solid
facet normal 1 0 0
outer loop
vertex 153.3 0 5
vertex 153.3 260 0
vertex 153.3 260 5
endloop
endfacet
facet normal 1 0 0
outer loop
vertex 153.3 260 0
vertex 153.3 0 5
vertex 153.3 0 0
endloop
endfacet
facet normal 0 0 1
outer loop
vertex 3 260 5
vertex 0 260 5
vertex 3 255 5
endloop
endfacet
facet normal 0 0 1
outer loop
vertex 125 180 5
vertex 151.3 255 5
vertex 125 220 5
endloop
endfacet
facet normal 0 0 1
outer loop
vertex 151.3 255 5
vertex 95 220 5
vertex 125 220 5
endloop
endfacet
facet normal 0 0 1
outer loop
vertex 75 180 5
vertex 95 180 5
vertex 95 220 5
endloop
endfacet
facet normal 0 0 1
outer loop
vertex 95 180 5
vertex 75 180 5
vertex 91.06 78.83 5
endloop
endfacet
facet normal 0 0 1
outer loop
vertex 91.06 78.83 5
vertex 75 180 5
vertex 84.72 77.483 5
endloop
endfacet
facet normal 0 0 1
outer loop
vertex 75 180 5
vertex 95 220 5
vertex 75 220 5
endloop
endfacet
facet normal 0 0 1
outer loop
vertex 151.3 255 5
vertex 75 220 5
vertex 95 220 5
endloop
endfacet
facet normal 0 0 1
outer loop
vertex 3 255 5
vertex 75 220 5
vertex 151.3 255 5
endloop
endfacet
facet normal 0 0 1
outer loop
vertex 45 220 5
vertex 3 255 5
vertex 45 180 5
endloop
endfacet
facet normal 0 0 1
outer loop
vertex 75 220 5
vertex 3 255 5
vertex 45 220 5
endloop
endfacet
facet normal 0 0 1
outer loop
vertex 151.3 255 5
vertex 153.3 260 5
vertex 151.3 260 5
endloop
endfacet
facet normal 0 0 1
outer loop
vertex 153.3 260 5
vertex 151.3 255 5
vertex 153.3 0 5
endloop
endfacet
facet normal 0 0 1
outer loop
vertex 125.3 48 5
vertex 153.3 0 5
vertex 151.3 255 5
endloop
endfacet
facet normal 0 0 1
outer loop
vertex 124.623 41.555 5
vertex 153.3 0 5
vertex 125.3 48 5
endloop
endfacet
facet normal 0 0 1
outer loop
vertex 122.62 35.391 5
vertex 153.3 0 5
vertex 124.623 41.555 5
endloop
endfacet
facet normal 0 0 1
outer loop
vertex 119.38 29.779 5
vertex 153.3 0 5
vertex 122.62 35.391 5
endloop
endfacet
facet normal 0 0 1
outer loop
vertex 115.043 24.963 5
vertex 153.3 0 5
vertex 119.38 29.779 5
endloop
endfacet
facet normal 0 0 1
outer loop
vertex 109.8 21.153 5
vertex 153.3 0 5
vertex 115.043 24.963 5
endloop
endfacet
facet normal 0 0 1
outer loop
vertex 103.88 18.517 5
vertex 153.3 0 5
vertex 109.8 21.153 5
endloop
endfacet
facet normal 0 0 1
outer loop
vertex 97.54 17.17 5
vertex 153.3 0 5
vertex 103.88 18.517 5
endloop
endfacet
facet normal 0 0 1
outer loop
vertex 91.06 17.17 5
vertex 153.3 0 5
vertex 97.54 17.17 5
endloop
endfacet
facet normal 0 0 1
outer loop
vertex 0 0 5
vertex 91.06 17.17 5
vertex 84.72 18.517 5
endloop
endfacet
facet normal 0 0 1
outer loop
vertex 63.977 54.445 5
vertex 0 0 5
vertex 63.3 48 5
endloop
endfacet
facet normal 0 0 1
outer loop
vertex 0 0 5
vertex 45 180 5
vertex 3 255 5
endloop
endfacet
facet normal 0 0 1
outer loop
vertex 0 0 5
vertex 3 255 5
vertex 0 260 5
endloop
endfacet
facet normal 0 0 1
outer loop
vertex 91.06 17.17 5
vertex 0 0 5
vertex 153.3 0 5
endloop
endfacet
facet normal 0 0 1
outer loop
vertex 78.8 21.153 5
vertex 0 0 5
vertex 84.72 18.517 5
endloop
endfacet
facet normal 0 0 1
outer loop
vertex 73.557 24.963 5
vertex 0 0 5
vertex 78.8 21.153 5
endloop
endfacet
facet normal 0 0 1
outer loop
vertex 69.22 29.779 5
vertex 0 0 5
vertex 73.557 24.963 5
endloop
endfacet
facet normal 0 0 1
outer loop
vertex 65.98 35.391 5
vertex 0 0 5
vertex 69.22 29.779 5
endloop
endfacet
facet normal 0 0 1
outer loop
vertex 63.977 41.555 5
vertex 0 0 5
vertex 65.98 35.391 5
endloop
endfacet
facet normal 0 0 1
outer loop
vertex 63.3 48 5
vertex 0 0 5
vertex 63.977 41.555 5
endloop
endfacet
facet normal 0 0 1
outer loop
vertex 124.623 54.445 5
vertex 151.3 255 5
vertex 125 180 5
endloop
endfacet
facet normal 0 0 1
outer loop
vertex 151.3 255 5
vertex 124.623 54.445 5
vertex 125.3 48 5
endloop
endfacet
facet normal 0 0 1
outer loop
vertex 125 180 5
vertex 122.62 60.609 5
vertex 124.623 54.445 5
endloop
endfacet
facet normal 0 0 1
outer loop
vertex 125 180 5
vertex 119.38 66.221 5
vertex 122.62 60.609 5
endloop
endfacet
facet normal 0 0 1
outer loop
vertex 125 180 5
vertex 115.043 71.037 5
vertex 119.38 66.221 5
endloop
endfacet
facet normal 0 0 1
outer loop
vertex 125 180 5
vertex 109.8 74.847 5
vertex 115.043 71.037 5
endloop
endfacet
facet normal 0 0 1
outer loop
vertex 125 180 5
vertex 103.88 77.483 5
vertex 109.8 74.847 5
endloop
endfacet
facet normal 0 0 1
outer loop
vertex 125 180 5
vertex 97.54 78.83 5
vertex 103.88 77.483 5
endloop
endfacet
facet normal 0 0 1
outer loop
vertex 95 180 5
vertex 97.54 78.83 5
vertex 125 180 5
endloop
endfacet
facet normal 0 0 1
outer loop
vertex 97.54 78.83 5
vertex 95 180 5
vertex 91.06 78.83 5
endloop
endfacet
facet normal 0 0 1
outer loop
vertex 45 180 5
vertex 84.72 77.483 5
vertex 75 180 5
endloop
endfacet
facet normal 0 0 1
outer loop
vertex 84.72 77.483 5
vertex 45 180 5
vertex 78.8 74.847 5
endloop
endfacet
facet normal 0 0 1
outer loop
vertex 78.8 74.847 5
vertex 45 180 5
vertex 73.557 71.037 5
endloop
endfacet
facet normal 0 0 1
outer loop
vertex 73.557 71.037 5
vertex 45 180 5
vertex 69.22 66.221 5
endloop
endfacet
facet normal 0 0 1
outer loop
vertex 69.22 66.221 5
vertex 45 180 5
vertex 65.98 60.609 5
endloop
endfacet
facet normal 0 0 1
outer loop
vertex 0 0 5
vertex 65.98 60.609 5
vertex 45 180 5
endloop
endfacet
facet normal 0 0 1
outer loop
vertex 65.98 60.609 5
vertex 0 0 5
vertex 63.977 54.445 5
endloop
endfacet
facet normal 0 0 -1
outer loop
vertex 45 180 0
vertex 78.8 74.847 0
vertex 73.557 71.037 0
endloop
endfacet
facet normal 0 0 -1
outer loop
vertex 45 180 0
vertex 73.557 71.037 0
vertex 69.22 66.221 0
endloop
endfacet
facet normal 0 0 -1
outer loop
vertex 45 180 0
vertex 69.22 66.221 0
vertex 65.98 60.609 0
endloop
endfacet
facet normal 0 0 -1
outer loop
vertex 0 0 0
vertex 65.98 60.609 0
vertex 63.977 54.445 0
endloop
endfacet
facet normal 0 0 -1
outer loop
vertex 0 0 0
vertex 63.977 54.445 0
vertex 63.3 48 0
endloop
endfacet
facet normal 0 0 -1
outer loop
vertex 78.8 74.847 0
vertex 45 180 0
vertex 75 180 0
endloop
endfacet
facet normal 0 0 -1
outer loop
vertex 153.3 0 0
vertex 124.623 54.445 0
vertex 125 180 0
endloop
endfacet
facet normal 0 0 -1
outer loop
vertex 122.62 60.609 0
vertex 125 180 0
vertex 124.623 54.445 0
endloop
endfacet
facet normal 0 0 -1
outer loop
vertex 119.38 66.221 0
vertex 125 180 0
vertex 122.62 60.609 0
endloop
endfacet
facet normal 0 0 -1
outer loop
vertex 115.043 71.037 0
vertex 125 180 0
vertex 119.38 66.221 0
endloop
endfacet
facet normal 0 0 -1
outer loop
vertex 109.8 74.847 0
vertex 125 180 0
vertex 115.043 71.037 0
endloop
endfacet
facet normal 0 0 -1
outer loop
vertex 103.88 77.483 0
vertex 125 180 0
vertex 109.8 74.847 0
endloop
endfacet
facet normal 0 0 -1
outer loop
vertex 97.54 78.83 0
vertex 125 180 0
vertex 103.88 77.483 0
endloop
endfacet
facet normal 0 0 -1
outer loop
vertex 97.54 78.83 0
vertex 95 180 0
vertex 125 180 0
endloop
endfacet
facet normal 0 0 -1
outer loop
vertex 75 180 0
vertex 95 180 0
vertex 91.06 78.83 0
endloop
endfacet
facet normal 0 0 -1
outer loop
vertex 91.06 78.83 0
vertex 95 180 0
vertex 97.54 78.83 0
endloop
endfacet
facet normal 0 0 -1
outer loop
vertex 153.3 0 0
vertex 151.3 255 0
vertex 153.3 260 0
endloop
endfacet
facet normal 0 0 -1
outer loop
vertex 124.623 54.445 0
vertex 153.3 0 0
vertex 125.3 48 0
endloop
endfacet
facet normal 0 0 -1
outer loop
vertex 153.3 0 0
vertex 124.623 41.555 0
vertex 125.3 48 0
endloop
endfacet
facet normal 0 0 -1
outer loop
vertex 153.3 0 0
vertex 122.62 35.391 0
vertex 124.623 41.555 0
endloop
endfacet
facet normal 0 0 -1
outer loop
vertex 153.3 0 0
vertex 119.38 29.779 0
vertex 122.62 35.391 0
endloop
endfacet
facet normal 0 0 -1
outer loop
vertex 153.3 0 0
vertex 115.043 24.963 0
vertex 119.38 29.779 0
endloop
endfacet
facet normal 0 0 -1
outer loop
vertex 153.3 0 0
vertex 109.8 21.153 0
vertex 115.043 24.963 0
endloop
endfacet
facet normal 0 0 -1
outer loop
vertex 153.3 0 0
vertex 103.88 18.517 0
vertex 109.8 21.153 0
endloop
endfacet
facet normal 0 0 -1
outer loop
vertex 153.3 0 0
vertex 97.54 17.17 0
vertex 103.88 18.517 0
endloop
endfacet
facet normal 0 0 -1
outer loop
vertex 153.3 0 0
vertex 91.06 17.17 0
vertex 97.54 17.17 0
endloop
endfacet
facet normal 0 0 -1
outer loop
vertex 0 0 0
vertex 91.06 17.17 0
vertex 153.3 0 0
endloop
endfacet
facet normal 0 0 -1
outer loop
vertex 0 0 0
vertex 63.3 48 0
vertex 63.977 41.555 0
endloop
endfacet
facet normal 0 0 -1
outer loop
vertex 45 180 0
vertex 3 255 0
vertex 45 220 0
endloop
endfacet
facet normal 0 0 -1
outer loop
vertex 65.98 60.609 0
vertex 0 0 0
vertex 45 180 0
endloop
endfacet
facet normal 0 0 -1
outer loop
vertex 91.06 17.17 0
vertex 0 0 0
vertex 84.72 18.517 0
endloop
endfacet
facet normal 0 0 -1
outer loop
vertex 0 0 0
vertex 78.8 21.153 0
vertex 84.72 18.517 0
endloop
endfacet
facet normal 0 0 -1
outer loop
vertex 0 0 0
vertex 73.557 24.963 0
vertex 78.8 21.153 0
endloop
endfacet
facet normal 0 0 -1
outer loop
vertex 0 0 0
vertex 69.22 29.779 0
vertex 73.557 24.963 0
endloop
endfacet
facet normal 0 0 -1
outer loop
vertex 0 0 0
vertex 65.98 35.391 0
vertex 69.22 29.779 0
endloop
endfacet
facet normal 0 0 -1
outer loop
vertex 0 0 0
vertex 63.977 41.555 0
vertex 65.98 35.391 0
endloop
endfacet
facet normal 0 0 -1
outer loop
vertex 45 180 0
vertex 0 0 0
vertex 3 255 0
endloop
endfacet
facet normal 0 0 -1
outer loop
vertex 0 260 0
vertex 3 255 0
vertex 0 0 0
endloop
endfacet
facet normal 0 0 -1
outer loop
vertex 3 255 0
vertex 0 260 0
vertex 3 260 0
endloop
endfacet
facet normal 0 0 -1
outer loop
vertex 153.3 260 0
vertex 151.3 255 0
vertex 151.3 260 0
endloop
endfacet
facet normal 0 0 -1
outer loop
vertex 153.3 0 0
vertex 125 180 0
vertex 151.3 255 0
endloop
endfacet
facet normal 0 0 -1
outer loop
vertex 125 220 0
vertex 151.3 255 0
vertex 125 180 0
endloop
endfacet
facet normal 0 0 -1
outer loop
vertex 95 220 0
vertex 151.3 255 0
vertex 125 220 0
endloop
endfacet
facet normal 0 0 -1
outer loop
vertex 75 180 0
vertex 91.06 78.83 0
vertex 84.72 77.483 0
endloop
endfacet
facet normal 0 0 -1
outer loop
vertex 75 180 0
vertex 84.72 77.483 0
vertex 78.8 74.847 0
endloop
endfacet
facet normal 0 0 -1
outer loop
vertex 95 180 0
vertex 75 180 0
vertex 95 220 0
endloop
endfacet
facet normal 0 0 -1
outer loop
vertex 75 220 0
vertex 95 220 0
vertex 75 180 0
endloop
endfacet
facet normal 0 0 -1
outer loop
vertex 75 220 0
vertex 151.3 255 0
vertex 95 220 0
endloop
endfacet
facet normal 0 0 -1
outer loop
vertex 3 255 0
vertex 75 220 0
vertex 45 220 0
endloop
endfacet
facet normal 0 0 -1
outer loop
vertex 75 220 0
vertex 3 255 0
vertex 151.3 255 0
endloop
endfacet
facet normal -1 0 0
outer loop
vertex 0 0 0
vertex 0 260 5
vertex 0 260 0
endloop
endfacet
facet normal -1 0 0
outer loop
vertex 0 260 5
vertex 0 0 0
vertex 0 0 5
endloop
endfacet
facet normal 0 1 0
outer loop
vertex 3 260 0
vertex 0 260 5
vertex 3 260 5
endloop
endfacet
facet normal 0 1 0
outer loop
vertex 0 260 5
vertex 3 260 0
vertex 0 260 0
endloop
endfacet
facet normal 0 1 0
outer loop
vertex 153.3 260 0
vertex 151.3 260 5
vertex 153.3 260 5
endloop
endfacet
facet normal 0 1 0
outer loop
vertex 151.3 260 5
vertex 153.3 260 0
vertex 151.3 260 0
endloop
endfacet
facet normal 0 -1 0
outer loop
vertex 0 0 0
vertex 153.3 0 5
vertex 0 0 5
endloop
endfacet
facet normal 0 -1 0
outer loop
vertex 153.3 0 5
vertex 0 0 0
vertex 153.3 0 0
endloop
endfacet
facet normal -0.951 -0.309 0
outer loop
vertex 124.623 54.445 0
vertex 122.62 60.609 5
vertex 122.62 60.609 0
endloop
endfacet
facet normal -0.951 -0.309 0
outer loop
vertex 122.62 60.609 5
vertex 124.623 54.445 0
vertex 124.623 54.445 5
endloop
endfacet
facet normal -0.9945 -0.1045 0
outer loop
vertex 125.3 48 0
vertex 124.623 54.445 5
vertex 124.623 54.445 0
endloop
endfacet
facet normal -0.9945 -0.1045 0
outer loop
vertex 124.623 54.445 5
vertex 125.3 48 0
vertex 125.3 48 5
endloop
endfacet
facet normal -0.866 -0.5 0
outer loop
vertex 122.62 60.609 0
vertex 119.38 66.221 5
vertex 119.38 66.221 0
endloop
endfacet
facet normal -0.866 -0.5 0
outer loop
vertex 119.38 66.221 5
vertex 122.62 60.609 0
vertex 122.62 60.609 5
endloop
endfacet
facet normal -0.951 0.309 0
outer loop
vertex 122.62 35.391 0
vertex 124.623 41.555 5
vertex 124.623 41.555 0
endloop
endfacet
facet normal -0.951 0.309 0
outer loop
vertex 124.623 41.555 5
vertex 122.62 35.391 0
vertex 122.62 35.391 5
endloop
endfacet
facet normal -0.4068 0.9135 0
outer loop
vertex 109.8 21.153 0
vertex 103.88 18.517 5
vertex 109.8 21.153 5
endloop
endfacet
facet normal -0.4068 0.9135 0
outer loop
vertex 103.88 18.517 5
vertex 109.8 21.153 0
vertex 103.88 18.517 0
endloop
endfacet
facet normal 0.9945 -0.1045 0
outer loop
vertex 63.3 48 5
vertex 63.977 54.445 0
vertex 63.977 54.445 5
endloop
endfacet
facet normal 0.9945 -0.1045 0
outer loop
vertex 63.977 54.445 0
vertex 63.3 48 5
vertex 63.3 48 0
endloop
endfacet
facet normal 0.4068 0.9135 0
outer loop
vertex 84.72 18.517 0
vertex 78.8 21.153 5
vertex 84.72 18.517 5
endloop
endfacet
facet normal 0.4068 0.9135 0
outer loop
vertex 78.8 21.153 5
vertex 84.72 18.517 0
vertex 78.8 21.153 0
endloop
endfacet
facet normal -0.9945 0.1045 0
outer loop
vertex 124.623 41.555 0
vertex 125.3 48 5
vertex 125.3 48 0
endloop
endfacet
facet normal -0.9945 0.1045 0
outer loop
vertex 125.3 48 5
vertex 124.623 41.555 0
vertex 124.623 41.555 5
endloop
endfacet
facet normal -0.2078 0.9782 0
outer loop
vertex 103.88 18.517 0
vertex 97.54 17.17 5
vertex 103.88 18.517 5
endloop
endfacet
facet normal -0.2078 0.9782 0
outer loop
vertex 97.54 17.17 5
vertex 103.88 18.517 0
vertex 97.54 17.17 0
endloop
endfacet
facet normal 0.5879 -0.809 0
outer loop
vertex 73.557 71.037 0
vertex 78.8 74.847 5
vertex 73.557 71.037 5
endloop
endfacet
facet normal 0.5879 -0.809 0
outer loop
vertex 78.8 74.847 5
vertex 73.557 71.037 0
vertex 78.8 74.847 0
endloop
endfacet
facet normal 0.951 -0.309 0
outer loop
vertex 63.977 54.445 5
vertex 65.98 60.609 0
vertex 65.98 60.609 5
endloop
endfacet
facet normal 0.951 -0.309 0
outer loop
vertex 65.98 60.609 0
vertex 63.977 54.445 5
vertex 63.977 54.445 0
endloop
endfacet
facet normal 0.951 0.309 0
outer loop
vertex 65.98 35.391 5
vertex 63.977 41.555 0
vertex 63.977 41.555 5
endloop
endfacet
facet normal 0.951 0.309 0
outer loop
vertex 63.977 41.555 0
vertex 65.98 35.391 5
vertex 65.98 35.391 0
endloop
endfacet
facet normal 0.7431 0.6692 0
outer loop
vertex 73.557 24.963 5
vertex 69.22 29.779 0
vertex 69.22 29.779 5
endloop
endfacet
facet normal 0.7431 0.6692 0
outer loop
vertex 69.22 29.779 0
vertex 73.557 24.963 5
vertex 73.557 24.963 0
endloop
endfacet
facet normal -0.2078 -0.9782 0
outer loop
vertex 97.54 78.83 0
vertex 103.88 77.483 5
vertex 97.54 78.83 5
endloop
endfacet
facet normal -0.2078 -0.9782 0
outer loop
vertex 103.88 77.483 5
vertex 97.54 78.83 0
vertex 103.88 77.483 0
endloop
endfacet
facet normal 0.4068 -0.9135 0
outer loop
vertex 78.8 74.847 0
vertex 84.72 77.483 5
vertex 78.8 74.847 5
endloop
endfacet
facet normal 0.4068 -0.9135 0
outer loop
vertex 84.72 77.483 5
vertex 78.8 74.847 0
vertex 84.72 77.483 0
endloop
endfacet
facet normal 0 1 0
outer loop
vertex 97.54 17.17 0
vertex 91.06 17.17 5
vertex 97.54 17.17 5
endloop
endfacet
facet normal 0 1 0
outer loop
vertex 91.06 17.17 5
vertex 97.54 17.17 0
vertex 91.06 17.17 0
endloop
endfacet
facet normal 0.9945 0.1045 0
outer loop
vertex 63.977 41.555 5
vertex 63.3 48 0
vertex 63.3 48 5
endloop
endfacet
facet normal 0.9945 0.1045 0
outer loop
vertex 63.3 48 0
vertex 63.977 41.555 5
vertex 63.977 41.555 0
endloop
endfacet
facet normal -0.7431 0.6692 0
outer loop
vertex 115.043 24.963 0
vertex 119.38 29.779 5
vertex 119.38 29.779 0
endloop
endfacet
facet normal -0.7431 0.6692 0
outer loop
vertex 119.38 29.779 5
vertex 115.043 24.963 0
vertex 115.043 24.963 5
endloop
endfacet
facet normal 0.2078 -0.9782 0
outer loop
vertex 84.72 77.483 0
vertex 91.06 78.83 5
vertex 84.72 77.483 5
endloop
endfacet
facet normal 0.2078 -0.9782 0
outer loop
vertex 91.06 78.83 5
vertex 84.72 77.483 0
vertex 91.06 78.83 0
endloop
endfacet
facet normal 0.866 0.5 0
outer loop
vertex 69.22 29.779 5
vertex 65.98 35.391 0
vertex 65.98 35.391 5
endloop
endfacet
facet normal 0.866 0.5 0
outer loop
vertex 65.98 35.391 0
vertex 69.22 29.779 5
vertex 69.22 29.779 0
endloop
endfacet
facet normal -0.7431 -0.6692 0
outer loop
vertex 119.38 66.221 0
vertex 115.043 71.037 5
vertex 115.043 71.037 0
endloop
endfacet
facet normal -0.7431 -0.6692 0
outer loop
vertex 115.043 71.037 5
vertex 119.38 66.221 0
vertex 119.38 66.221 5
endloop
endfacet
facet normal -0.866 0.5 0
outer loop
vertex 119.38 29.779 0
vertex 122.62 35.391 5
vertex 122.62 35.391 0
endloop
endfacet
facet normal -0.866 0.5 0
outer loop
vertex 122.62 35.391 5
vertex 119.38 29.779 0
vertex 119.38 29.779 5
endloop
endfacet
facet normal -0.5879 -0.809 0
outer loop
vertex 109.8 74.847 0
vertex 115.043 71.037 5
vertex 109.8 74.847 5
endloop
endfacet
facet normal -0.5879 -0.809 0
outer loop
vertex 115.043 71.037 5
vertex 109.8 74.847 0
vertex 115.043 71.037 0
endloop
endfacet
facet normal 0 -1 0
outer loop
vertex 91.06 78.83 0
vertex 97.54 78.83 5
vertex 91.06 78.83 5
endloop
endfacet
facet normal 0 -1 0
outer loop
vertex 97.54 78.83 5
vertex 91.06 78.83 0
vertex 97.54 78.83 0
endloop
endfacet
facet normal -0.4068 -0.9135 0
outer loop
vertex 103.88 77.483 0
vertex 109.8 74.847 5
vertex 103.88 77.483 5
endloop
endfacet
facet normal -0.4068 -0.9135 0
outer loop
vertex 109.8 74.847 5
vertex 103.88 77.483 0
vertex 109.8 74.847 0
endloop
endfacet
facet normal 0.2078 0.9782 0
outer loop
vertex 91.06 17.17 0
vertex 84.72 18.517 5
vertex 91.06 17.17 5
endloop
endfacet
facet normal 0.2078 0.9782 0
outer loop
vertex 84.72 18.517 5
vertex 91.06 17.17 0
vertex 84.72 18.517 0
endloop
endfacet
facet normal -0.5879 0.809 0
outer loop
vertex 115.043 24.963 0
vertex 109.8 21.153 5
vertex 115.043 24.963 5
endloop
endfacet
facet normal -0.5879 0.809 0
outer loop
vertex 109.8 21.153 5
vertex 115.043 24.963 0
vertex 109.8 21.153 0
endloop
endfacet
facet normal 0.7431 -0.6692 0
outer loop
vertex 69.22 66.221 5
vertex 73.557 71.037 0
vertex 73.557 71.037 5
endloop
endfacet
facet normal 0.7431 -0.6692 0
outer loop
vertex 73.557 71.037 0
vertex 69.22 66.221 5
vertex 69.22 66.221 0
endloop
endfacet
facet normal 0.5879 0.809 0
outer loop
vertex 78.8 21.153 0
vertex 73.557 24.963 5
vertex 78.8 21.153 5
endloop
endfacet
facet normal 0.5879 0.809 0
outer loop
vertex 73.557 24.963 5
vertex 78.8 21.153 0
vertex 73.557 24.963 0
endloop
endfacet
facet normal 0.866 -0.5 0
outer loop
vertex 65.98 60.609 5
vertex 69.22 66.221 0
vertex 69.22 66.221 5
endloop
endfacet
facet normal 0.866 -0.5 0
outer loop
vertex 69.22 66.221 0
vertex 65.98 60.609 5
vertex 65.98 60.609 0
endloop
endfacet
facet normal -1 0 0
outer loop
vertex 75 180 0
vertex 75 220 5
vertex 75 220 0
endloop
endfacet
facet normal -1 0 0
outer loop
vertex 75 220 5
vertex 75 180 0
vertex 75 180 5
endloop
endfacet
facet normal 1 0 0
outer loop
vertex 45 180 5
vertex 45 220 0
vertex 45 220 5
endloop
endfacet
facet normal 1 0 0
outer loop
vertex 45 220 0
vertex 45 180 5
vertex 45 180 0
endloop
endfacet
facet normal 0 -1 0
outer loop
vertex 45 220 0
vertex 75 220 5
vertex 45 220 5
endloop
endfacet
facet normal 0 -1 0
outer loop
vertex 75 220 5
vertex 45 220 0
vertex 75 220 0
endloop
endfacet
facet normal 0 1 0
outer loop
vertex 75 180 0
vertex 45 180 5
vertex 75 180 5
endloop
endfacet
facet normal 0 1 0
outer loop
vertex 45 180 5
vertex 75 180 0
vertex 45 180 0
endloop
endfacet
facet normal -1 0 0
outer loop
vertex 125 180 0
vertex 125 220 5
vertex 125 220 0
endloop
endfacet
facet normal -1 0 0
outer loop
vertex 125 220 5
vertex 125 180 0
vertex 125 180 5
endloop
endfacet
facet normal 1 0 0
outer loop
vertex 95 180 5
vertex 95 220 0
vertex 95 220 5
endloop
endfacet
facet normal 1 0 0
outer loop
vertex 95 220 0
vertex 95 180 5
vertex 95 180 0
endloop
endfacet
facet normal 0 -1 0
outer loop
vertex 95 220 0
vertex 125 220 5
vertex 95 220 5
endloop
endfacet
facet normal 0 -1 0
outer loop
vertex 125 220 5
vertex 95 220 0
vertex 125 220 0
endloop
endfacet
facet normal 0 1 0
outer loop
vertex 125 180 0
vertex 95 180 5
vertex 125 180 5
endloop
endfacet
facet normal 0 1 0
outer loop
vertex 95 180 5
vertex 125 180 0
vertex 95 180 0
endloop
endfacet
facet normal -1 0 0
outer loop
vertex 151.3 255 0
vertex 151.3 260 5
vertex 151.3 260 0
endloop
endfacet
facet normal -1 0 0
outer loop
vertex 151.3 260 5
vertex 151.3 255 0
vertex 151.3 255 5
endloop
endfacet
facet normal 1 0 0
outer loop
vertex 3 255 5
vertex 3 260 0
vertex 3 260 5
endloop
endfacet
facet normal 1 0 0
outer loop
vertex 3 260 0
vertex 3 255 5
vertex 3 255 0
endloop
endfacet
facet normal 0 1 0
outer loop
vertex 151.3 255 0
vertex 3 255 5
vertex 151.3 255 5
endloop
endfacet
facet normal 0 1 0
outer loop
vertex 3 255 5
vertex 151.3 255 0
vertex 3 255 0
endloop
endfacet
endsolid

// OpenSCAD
cubeWidth = 153.3; 
cubeLength = 260;
cubeHeigth = 5; 



difference() {
    
cube([cubeWidth,cubeLength,cubeHeigth]);
    translate([94.3,48,0])
    cylinder(d=62, h=20);
    
    translate([45,180,0])
    cube([30,40,6]);
    
    translate([95,180,0])
    cube([30,40,6]);
    
    
    translate([3,255,0])
    cube([148.3,10,10]);
    
}
